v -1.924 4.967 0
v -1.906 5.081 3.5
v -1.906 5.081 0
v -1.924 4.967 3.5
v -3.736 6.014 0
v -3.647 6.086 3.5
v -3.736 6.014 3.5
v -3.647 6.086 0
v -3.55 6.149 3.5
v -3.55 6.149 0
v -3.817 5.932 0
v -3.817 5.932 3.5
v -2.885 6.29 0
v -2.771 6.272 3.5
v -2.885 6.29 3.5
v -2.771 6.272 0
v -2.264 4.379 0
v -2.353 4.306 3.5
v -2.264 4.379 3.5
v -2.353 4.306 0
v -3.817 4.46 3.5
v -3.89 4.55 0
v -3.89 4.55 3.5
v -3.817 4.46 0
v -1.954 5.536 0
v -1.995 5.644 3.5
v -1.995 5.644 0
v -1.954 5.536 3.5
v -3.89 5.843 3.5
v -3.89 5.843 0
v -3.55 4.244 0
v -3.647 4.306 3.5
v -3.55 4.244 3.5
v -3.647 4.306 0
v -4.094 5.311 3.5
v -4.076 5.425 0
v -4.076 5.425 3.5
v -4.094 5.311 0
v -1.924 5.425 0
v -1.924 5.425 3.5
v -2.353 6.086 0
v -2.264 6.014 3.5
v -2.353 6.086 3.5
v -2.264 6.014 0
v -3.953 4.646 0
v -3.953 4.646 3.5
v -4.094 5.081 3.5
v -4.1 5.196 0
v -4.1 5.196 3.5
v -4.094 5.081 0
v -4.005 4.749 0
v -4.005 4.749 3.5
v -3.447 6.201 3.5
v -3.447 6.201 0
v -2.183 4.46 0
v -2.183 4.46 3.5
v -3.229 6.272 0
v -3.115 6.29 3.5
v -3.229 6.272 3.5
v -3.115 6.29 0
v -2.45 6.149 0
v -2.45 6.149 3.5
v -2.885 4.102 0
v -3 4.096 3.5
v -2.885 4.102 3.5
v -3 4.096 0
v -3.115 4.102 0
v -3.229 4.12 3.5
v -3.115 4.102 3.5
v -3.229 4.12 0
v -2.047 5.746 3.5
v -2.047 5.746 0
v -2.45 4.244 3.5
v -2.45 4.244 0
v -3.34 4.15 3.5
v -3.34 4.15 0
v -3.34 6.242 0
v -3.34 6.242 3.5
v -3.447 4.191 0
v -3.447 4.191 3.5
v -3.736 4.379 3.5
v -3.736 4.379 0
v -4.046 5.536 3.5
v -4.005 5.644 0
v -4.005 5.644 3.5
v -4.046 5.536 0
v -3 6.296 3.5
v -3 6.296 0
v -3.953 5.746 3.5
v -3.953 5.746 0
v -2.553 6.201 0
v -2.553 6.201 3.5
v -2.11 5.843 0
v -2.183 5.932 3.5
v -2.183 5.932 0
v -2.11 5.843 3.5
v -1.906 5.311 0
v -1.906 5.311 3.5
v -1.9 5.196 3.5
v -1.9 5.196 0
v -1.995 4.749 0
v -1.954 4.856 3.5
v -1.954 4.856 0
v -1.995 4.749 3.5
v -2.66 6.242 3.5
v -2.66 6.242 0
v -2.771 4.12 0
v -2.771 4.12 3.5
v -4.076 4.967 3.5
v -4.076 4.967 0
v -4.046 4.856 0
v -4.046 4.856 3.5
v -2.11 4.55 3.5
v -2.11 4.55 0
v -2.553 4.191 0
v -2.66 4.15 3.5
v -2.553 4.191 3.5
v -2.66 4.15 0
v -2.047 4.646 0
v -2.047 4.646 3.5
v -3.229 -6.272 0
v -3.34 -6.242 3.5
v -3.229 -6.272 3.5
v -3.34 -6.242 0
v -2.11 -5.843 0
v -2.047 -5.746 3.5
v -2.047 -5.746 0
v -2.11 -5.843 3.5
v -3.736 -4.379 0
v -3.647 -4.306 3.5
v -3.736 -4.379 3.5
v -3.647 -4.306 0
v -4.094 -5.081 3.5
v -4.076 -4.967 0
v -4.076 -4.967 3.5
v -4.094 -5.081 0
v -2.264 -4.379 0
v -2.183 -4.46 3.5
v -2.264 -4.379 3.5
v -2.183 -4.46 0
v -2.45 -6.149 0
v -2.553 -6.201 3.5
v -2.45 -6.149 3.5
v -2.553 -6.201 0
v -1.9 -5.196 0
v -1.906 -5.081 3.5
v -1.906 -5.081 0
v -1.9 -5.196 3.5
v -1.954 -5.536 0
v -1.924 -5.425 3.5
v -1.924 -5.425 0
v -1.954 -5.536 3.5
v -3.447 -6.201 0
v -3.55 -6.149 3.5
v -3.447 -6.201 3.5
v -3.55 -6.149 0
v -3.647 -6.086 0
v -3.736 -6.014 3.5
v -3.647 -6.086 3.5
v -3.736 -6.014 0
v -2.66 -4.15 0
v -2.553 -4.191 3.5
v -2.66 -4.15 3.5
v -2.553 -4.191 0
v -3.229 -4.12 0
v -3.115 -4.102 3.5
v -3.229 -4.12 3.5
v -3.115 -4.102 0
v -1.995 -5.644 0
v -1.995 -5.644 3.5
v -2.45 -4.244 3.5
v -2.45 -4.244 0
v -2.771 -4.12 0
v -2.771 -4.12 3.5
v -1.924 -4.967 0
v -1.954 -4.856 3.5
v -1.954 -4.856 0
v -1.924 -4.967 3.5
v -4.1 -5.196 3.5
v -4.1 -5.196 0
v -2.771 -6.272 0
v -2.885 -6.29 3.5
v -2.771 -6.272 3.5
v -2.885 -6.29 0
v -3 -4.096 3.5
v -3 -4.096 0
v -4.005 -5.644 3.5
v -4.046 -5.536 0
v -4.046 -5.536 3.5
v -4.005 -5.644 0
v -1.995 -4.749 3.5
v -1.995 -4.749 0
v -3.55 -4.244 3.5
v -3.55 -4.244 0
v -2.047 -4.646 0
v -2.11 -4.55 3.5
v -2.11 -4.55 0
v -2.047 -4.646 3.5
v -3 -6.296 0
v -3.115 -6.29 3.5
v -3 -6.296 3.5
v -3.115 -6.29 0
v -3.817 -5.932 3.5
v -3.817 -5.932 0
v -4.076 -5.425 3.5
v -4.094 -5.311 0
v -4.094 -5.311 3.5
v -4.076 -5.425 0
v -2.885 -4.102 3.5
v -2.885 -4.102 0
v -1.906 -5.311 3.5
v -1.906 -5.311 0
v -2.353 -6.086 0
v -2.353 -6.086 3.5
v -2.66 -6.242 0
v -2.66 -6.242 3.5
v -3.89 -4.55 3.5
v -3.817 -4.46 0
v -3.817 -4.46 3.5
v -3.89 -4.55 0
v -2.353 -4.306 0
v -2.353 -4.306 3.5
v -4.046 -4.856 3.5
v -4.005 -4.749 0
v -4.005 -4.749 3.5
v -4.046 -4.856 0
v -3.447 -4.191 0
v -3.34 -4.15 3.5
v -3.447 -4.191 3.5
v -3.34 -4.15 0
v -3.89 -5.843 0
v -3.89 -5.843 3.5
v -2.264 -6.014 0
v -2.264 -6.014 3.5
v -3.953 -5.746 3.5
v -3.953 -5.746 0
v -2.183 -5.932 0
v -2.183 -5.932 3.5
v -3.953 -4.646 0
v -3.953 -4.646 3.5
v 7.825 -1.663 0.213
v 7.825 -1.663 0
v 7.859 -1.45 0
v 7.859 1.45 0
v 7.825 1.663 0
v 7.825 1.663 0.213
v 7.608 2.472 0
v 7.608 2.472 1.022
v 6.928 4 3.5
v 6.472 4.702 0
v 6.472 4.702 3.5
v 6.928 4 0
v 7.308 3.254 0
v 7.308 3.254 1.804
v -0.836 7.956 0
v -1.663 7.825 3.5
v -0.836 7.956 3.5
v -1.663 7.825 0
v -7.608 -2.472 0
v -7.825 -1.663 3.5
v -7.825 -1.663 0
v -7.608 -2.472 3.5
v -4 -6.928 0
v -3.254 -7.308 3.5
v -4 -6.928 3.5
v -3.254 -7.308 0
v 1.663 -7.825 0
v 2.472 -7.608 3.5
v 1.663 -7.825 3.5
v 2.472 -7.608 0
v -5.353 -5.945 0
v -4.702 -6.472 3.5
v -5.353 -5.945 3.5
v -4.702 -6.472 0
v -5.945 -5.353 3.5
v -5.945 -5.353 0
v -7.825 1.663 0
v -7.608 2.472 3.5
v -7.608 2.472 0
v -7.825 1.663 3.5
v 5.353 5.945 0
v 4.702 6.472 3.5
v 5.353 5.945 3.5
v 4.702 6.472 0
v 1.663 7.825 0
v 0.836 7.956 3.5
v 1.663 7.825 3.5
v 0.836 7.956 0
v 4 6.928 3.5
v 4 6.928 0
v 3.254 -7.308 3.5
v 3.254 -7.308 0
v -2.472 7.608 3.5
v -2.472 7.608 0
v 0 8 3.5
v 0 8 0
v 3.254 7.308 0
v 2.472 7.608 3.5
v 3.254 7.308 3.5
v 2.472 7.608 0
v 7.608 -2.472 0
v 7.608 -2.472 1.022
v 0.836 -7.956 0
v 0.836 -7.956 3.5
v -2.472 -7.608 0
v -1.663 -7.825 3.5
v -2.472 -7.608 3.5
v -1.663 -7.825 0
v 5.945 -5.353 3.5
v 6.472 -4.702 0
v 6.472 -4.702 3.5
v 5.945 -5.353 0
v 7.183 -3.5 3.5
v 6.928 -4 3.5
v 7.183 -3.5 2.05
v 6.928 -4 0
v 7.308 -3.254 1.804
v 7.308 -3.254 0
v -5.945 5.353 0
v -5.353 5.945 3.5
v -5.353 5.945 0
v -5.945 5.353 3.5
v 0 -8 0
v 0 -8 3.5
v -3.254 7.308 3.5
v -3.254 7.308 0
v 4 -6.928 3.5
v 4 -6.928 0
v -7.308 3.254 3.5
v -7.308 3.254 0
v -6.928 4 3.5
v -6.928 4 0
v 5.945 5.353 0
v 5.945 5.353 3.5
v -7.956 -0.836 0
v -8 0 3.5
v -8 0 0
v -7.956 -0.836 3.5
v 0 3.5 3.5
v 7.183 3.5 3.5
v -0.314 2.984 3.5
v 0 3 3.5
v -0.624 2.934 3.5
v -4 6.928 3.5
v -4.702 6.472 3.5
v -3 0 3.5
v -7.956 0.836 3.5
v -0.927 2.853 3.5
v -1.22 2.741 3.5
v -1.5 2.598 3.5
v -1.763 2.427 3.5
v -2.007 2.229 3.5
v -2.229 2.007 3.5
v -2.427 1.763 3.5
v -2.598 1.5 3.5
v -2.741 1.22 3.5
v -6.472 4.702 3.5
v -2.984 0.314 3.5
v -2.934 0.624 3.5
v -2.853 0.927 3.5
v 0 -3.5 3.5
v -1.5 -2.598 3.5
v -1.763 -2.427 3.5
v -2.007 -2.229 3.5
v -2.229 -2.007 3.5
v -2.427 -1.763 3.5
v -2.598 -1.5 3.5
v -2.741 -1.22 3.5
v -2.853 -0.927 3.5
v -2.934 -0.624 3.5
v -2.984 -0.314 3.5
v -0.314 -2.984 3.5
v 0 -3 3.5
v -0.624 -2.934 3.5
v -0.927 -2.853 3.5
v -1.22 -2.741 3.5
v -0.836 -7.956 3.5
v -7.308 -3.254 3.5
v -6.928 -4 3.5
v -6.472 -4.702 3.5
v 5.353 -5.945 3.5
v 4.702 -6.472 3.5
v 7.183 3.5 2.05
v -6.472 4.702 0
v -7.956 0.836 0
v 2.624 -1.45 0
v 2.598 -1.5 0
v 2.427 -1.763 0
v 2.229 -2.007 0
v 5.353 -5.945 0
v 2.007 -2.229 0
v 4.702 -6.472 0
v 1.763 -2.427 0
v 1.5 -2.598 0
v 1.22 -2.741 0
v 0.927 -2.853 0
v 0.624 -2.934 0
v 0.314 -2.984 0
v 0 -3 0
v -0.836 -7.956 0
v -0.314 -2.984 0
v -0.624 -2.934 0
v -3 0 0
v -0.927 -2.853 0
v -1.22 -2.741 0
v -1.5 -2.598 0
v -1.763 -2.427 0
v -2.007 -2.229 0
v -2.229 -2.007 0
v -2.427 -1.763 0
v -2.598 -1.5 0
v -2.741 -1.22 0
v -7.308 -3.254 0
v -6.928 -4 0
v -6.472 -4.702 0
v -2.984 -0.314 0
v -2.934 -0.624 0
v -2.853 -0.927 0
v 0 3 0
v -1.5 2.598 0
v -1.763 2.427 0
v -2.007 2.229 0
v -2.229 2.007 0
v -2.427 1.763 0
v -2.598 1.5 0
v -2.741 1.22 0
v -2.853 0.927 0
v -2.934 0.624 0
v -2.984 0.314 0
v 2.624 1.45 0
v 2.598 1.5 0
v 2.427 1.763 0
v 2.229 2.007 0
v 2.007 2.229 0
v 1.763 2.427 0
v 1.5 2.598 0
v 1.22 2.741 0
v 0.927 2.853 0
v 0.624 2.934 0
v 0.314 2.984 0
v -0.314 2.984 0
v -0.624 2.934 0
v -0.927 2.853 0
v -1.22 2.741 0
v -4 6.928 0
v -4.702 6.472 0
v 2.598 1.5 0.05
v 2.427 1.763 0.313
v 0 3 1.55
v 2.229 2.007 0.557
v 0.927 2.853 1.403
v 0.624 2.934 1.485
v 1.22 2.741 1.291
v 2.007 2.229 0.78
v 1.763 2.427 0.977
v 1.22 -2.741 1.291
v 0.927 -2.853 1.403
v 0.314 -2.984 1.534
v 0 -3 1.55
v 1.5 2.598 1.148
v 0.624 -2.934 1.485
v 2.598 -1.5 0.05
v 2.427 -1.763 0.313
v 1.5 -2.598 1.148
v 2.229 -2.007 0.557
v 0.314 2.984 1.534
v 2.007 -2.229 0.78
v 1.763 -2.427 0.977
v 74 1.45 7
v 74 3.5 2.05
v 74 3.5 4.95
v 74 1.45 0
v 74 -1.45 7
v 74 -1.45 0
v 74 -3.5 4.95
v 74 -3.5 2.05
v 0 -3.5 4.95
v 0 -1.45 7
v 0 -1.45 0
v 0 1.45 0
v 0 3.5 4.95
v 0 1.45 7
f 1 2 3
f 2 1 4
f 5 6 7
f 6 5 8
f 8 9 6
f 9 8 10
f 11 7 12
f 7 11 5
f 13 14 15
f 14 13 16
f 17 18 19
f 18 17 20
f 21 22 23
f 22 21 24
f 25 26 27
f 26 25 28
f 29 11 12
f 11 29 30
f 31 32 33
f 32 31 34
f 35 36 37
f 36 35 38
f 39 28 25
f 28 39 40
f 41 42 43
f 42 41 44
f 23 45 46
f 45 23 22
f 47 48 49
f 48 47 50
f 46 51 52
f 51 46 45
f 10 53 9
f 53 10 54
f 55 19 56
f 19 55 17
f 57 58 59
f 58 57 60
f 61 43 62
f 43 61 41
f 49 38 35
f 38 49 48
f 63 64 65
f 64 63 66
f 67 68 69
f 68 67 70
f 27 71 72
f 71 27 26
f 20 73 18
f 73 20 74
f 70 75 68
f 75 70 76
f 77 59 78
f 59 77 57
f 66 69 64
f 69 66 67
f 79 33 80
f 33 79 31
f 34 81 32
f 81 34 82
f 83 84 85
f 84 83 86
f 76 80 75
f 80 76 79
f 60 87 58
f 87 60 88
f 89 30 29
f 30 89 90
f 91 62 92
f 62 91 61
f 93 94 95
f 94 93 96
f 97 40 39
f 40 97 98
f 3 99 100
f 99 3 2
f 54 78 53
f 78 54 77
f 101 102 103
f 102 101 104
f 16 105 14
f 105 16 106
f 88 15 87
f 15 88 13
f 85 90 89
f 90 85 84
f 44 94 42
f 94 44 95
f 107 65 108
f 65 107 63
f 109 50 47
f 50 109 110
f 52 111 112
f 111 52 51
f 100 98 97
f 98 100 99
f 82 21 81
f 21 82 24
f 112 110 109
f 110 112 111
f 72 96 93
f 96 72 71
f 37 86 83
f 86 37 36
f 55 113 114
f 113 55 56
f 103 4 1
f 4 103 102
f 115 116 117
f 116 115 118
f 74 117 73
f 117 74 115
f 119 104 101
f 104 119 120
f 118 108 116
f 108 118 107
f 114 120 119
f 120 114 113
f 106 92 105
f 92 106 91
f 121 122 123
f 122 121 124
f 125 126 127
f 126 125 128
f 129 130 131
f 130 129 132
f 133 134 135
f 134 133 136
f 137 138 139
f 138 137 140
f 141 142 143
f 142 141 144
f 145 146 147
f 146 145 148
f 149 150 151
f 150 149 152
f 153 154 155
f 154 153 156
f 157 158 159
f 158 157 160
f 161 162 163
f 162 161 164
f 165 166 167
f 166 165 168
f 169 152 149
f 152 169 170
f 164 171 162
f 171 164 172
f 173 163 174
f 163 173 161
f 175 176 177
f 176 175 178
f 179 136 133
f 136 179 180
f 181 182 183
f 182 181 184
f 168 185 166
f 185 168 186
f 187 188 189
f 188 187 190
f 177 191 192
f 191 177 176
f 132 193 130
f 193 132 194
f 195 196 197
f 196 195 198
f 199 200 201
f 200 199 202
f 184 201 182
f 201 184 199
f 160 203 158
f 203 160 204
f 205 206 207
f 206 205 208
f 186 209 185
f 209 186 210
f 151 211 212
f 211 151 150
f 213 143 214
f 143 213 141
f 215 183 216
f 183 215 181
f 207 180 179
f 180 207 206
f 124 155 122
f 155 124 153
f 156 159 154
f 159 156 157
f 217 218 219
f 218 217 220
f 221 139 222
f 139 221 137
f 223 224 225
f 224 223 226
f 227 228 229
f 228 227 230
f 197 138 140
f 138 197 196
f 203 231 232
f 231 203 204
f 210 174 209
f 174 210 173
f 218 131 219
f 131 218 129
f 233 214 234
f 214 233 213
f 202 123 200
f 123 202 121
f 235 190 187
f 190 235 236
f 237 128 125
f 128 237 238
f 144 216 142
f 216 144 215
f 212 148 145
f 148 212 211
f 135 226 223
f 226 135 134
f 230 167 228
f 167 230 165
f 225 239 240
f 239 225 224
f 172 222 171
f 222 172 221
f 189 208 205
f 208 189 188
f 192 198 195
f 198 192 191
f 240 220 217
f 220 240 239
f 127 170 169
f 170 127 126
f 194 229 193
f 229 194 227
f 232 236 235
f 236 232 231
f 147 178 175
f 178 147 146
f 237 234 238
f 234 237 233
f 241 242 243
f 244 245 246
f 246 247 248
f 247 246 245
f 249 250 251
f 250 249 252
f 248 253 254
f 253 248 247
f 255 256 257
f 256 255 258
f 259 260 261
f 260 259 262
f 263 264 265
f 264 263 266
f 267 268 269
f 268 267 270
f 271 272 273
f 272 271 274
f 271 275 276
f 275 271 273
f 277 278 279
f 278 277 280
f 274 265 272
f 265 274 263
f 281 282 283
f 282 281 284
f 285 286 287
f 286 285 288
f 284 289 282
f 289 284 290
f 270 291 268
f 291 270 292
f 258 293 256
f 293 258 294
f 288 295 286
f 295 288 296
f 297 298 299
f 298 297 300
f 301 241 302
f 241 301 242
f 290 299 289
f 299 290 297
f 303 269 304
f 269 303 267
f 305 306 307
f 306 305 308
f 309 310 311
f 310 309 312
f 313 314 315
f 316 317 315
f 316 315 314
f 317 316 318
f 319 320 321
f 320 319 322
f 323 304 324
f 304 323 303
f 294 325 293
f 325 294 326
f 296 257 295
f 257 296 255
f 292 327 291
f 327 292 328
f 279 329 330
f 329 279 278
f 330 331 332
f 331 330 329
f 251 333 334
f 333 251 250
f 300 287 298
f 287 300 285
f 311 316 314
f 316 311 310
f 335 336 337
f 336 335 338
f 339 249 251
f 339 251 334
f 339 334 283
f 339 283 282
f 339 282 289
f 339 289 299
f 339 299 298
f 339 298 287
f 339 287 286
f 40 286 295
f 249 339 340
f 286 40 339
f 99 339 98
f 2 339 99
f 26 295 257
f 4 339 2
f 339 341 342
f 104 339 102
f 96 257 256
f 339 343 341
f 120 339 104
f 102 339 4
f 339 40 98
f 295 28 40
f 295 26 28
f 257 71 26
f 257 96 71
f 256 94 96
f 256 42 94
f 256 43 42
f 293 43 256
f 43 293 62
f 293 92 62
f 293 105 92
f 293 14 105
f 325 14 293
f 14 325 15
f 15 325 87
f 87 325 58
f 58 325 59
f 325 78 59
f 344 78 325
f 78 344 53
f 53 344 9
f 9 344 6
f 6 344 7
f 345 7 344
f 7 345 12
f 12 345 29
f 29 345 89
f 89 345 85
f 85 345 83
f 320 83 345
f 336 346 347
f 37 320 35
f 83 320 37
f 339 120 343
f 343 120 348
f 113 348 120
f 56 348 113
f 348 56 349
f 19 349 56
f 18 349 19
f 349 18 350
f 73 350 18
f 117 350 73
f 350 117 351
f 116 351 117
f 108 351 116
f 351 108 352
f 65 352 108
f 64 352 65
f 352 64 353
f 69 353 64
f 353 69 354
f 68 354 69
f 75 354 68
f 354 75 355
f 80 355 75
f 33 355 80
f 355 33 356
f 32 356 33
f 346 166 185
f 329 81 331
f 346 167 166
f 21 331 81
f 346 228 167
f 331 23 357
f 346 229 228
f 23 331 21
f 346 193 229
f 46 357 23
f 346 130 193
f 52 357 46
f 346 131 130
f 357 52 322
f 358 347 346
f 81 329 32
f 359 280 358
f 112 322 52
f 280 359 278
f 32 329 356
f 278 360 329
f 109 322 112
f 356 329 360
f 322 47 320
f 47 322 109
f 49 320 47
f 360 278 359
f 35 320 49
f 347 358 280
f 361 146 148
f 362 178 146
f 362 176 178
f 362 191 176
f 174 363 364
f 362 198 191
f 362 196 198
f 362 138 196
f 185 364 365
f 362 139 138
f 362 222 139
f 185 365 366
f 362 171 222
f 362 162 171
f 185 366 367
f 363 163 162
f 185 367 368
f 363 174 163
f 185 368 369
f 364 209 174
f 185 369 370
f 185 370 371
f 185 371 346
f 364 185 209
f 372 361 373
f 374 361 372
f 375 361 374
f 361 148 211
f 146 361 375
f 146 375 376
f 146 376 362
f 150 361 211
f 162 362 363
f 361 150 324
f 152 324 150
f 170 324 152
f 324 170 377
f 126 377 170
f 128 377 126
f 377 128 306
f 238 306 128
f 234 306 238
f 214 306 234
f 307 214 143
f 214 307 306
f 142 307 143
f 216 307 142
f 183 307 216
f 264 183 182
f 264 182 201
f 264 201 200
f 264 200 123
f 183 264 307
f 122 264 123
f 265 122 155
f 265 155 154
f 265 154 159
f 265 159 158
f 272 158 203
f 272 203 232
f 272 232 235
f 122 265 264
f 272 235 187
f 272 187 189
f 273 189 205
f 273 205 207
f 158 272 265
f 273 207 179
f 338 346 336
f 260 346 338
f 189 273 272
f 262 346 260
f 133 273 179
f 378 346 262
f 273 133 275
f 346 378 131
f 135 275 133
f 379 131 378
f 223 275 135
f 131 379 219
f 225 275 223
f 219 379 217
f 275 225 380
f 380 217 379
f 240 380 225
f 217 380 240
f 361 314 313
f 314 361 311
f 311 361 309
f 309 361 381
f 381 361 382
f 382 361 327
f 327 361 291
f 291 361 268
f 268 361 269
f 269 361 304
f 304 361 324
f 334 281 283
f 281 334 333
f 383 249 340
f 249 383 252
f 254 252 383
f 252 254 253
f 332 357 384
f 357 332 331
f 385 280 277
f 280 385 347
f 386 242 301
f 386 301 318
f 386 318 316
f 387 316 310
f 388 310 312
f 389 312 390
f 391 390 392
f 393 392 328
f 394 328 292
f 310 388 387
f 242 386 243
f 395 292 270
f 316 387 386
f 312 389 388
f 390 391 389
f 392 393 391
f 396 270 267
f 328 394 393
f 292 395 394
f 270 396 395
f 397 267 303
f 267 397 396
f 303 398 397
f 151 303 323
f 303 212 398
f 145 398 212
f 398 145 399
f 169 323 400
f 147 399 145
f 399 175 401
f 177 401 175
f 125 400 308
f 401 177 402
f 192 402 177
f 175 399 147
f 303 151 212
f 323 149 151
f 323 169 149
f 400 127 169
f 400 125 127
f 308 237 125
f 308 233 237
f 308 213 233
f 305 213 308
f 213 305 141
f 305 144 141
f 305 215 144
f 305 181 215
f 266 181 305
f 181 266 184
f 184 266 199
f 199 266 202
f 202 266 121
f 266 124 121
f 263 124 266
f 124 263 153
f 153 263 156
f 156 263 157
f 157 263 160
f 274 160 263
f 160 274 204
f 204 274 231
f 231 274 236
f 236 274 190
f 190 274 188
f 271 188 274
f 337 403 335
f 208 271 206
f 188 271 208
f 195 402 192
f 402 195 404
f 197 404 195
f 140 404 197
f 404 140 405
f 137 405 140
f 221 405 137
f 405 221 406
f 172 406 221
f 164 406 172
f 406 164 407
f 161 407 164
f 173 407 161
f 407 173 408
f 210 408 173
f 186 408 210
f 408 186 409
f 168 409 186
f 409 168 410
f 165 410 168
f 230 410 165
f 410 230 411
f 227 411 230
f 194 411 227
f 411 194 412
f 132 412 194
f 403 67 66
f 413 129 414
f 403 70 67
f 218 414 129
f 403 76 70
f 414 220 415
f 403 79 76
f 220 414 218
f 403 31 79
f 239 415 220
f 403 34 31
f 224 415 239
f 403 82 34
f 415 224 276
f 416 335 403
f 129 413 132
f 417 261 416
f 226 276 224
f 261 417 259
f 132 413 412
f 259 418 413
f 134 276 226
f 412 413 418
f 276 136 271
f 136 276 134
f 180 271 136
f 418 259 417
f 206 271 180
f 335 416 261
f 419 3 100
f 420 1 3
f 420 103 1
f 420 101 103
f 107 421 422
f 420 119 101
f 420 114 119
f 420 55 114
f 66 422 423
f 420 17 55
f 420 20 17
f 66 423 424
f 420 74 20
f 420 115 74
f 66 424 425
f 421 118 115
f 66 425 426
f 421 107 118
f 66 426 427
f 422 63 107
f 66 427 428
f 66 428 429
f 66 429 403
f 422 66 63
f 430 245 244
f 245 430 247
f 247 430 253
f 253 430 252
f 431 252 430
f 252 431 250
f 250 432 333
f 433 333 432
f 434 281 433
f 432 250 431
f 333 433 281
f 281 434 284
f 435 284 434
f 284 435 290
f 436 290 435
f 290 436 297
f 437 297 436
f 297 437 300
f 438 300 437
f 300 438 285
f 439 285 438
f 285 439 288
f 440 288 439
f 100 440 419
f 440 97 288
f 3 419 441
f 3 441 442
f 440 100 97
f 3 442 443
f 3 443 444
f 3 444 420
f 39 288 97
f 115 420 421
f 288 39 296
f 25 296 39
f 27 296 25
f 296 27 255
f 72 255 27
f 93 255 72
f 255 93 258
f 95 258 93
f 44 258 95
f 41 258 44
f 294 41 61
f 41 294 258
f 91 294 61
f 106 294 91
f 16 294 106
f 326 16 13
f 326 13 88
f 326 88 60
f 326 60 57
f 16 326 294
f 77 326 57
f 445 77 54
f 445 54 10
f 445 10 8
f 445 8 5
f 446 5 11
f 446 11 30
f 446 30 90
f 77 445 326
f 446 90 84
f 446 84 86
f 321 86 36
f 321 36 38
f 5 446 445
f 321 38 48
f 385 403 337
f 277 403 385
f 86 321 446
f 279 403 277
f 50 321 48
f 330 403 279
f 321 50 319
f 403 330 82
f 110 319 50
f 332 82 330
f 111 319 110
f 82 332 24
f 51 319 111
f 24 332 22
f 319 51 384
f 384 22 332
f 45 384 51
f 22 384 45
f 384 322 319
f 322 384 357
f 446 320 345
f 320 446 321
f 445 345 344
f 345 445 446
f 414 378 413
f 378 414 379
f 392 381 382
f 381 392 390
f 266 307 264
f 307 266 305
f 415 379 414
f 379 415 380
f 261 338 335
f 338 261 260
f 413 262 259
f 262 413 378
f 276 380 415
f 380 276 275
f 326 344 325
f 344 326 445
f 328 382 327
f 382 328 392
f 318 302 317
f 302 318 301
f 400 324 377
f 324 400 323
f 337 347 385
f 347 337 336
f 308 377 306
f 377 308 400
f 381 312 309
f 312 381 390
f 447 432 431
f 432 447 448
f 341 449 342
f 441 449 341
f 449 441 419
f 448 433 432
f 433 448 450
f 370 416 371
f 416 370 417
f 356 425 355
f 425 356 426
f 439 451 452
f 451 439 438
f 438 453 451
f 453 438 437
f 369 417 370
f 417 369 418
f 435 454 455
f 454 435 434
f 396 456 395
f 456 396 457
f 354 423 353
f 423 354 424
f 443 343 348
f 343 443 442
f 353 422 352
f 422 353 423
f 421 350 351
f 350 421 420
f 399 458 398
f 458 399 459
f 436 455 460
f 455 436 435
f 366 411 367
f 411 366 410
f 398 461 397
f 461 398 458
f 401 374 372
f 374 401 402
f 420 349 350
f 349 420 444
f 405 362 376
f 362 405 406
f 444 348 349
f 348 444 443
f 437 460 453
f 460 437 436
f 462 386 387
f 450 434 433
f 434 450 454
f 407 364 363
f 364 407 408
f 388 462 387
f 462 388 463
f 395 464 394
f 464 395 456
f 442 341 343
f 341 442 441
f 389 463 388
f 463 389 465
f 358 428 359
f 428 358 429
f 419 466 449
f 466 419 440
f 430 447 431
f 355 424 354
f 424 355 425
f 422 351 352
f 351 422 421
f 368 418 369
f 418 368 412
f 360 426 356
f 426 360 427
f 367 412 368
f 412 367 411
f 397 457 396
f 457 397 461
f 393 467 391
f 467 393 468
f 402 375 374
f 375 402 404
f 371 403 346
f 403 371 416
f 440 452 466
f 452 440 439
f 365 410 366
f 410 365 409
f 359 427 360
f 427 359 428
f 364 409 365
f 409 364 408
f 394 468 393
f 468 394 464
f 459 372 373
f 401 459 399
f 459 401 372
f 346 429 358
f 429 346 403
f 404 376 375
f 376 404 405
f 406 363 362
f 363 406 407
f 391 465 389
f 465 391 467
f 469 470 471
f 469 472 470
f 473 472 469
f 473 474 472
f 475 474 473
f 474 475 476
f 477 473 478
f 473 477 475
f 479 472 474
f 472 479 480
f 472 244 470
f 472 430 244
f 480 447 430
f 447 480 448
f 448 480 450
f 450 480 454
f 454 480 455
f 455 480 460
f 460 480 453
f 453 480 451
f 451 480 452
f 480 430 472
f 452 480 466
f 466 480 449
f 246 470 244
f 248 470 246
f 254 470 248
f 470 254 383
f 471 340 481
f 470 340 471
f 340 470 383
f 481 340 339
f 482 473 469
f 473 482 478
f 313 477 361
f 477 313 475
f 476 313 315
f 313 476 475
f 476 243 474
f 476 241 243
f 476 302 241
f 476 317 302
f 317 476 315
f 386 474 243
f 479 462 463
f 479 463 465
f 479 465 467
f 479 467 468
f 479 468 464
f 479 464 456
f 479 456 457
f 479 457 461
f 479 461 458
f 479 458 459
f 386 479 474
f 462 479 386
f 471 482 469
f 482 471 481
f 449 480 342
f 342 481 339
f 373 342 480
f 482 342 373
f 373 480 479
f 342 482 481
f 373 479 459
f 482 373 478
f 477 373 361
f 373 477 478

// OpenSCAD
$fn=60;

bar(74);
pin();

module pin(){
difference(){
cylinder(d=16,h=3.5);
translate([0,0,-1])cylinder(d=6,h=9);
for(i=[0:120:240]){
    rotate([0,0,i])
    translate([6,0,-1])cylinder(d=2.2,h=5);
}
}
}

module bar(length){
translate([0,0,3.5])rotate([360/16,0,0])rotate([0,90,0])
    cylinder(d=7.577,h=length,$fn=8);
}
